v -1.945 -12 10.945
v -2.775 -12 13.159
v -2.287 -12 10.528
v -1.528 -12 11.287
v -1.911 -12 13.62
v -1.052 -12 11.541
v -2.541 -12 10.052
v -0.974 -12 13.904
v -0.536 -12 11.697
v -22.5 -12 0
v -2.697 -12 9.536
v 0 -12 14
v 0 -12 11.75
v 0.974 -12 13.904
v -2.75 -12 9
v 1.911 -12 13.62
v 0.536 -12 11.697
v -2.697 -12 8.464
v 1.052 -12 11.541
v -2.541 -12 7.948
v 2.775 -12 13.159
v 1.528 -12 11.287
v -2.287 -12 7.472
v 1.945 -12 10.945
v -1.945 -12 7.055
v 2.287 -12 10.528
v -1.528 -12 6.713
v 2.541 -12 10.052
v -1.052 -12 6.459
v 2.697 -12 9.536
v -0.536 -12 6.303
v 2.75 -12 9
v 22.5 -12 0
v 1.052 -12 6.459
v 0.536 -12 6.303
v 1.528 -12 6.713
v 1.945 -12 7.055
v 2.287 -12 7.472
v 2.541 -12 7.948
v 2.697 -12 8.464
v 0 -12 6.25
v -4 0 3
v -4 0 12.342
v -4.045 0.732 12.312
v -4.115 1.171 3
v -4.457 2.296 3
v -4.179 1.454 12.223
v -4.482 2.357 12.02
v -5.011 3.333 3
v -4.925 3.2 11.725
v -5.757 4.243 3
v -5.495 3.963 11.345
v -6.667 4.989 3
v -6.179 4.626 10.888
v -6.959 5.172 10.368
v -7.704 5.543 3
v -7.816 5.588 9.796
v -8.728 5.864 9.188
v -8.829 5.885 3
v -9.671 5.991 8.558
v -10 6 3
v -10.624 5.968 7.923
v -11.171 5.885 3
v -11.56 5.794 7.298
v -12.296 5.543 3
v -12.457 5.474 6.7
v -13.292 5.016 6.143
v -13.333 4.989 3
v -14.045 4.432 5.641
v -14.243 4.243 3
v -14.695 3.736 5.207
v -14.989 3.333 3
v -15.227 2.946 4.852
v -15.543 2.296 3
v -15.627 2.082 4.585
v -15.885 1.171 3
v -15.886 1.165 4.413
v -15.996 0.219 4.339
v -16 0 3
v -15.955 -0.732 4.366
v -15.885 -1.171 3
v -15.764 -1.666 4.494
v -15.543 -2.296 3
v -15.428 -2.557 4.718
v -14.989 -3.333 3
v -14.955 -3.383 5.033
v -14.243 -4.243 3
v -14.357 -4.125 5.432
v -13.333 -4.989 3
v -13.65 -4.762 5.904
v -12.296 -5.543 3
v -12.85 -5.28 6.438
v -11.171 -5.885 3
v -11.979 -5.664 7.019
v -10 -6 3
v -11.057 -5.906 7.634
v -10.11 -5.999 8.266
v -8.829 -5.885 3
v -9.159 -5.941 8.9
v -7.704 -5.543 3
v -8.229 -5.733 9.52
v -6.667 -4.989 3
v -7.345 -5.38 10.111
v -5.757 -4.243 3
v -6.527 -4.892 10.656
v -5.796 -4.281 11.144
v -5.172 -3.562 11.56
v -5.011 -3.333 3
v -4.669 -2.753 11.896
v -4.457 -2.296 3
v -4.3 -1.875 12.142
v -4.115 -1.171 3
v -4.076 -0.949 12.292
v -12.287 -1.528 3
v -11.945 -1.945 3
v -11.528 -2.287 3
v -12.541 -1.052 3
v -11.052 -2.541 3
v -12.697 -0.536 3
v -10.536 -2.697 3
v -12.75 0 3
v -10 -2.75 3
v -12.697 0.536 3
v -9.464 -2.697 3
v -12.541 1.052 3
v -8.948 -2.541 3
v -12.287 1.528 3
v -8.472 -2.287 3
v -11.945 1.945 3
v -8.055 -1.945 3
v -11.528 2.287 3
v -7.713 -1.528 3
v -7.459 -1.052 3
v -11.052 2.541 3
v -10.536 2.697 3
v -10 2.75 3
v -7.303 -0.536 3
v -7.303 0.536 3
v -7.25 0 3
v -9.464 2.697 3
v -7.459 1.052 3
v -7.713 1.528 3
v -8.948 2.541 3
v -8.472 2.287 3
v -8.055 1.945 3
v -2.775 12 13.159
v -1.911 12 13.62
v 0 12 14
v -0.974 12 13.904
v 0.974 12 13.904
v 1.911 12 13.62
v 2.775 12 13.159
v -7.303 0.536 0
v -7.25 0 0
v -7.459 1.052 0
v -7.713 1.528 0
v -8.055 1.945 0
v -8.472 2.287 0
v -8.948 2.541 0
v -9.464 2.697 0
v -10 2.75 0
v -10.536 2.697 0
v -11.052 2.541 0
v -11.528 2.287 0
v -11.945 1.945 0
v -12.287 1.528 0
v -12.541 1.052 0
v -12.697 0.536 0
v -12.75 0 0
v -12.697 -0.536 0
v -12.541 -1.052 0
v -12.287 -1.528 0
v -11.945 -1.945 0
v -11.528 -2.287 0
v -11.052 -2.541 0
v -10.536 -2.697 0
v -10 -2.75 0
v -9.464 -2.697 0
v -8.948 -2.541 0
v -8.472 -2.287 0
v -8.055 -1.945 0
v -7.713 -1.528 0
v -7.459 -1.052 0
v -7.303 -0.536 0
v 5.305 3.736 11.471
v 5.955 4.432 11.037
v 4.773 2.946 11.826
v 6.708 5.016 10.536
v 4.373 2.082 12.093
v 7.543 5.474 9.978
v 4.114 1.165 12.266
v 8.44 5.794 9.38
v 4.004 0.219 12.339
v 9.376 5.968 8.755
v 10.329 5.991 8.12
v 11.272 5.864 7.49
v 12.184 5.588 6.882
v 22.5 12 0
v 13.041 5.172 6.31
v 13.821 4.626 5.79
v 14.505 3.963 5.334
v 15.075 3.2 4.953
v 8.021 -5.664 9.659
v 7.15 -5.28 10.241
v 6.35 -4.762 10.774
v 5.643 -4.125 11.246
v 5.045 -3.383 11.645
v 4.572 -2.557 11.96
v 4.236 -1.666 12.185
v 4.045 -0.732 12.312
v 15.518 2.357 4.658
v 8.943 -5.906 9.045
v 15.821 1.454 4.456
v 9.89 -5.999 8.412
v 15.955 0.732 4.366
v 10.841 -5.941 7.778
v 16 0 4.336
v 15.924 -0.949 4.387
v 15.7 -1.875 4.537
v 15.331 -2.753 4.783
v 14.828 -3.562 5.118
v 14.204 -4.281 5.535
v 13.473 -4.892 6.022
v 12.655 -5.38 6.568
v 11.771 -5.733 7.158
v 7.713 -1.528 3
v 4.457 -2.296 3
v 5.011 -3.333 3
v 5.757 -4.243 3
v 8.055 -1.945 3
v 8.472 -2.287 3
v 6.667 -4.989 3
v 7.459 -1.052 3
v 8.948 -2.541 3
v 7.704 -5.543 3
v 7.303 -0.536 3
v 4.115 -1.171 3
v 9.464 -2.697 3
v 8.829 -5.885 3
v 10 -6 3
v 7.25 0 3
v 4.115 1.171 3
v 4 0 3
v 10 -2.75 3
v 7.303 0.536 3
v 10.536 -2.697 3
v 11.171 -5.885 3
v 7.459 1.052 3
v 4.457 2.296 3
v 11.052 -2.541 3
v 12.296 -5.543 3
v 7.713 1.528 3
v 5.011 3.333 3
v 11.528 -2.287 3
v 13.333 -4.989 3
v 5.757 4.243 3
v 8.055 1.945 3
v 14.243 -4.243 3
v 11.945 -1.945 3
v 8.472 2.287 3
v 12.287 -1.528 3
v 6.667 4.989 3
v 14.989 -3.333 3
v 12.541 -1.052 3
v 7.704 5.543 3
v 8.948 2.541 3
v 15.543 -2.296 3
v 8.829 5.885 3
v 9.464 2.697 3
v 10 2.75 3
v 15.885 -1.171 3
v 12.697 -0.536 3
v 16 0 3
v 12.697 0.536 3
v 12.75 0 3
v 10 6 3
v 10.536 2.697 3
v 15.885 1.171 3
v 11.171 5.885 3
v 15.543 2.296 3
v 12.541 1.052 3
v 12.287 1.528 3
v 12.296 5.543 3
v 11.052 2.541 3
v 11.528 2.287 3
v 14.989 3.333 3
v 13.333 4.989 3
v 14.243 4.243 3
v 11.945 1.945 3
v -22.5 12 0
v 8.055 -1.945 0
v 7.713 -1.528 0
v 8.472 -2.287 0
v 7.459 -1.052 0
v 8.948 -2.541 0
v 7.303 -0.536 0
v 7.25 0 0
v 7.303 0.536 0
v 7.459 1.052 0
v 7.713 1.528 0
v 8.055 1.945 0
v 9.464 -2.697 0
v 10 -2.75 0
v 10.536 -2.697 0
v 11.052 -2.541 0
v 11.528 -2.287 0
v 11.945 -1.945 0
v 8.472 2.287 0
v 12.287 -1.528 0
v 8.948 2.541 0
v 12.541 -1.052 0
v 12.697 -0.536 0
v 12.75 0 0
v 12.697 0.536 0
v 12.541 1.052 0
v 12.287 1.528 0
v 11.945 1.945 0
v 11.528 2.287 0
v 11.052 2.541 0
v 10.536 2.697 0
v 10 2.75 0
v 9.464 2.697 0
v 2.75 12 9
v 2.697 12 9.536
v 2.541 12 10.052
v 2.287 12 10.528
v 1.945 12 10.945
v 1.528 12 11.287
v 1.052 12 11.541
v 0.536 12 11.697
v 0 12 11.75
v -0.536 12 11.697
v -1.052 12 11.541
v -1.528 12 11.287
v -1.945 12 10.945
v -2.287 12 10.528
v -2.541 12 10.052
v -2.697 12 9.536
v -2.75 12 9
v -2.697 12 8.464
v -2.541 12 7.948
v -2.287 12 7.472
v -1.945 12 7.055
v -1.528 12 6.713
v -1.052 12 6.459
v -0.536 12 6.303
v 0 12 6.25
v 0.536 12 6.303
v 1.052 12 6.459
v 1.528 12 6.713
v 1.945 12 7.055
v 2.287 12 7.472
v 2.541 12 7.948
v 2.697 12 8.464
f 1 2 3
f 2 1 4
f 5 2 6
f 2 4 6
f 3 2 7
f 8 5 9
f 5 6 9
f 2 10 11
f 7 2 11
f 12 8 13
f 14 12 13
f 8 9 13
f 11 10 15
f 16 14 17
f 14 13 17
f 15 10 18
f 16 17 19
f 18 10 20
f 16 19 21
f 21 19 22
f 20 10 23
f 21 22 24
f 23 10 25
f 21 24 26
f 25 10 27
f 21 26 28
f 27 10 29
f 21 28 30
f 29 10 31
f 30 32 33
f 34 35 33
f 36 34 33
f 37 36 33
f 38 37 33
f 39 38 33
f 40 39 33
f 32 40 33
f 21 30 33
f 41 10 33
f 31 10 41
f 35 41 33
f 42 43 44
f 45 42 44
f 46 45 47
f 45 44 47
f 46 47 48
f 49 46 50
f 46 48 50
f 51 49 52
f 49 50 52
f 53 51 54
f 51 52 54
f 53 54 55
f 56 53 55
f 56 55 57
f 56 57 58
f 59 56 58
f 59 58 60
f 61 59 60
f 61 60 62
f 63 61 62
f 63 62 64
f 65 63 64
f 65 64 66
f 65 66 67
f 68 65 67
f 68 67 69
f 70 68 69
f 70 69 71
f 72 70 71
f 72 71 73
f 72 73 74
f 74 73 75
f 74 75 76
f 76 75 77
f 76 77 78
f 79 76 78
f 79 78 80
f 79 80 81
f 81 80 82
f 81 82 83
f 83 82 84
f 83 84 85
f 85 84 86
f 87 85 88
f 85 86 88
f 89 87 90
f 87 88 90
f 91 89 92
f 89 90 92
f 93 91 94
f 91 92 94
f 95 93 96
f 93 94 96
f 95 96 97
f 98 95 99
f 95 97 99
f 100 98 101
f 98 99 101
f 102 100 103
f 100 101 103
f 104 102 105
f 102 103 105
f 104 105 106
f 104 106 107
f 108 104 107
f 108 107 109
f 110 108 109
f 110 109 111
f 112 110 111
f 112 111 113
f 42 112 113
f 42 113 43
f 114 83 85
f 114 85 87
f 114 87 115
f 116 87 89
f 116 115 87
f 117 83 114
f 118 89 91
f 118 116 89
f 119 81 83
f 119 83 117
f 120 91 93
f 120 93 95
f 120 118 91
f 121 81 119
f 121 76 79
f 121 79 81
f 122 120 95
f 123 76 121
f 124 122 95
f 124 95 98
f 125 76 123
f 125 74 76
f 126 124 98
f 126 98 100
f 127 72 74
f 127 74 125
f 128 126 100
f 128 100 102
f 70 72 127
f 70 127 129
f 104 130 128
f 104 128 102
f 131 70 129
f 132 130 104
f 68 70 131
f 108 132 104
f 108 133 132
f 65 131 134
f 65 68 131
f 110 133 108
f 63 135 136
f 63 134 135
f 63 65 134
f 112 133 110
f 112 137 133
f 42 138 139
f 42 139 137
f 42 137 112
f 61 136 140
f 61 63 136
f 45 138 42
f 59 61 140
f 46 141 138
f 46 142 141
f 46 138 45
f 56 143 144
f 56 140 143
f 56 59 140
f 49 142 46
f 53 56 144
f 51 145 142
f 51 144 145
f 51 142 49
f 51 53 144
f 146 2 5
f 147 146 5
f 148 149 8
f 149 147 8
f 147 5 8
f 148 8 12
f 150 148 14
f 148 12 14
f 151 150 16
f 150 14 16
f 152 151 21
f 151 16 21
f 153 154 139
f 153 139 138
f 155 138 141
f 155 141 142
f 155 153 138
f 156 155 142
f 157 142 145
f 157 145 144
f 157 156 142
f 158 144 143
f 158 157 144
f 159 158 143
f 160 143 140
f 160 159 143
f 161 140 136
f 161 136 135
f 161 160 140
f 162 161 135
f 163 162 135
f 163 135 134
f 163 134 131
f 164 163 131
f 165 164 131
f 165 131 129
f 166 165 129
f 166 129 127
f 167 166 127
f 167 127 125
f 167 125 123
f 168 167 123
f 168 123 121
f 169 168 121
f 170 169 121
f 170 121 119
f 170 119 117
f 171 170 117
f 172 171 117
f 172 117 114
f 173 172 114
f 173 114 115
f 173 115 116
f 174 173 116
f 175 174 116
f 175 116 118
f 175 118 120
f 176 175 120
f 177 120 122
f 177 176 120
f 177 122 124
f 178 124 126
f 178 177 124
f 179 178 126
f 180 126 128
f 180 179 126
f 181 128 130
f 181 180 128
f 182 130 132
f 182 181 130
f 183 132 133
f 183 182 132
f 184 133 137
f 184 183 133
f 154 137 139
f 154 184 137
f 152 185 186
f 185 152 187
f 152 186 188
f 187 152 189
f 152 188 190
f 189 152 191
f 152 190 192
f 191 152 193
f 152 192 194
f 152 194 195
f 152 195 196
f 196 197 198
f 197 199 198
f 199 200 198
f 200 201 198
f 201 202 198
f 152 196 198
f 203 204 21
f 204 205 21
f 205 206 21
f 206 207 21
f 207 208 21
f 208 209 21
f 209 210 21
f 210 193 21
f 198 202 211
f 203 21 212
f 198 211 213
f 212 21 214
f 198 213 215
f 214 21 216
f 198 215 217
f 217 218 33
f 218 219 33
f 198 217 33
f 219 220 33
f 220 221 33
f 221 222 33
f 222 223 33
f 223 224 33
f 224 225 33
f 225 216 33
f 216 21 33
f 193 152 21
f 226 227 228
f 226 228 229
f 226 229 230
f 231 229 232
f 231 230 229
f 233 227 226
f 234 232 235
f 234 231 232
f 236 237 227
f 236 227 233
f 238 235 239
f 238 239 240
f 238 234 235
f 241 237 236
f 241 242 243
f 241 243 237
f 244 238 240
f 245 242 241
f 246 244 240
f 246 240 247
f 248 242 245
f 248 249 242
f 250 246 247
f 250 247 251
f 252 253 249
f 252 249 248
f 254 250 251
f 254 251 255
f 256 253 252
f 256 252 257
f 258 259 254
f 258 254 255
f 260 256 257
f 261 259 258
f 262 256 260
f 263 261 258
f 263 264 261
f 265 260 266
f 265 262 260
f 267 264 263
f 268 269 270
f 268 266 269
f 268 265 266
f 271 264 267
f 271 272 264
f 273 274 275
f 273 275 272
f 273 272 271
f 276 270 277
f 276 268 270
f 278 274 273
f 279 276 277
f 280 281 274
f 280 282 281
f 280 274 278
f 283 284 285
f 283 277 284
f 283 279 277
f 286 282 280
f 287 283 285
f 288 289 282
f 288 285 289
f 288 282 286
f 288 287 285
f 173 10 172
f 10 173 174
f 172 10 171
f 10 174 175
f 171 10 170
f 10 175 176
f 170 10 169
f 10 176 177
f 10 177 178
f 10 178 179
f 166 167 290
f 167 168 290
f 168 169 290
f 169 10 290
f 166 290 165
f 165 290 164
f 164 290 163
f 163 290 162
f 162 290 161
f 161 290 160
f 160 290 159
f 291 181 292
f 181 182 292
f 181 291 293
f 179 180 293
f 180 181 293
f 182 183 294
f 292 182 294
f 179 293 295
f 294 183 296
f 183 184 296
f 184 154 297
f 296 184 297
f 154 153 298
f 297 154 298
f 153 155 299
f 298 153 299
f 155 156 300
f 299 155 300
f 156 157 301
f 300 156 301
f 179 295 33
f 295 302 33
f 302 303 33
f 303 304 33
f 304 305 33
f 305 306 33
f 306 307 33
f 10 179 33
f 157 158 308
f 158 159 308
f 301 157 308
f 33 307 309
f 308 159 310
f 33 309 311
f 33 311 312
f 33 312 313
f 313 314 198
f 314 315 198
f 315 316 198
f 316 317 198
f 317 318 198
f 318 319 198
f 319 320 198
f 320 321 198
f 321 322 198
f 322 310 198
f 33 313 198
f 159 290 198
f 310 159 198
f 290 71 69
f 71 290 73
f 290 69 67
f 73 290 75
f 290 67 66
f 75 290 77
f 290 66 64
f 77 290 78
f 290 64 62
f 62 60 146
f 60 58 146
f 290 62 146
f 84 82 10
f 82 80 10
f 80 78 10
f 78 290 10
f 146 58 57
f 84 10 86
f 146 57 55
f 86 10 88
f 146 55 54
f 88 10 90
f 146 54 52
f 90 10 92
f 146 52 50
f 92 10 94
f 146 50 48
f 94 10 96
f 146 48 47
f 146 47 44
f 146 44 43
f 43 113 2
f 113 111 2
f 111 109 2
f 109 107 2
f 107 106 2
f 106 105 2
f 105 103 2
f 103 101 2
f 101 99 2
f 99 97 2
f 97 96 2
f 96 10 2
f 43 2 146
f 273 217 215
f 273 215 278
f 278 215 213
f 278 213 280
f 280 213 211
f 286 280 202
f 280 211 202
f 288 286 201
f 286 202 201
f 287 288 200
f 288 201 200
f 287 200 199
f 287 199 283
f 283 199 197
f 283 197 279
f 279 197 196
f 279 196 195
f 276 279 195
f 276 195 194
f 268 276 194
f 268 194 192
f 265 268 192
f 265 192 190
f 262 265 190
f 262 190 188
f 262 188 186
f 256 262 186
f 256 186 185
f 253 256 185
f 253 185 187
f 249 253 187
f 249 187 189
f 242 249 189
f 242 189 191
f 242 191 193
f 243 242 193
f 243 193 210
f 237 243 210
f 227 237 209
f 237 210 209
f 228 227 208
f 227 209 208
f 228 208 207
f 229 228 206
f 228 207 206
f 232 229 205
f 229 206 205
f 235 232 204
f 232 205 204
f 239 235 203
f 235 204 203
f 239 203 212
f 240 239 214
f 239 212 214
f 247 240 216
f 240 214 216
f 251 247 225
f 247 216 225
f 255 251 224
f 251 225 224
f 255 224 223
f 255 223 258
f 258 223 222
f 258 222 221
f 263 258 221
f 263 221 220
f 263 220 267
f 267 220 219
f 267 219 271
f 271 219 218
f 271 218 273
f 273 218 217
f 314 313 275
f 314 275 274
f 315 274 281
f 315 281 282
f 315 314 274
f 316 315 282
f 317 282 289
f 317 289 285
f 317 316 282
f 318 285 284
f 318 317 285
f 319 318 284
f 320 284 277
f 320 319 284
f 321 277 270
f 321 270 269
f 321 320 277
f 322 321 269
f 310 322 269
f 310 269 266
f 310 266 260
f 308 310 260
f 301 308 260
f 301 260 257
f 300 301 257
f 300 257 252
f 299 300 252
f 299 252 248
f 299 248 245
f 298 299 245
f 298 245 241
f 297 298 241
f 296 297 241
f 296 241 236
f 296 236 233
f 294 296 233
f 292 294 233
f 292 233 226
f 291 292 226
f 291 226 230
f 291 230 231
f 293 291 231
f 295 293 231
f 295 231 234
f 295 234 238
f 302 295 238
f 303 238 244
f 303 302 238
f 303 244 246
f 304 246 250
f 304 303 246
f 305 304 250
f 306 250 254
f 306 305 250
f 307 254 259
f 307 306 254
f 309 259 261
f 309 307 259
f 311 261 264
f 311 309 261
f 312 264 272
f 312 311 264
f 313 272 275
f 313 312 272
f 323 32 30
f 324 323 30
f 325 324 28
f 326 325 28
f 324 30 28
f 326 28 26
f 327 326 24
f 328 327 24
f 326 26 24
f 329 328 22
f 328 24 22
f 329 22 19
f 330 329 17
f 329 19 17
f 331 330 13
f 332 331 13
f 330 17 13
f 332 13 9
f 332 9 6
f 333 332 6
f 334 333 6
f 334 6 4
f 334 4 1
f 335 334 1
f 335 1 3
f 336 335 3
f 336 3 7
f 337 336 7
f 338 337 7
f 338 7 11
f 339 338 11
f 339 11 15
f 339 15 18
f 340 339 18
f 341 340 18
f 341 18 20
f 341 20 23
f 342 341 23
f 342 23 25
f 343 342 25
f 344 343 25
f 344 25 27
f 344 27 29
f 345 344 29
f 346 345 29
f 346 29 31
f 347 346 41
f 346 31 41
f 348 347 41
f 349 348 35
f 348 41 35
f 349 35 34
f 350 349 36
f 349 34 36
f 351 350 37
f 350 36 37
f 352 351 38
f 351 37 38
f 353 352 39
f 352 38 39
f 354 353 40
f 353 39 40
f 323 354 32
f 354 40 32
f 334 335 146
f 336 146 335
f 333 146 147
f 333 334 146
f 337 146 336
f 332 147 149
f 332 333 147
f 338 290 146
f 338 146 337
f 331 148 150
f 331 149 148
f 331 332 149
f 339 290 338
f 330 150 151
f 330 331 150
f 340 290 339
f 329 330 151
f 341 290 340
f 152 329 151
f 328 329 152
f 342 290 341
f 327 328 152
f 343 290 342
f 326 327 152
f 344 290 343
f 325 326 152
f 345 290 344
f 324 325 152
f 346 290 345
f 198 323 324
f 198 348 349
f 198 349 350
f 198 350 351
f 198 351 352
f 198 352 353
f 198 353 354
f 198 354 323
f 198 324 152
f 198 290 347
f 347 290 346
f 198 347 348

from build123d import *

# Parameters (mm, degrees)
F0_W     = 45
F0_H     = 24
F0_R     = 2.75
F1_DEPTH = 15
F2_R     = 6
F2_R_2   = 2.75
F3_DEPTH = 12
F4_R     = 2.75
F5_DEPTH = 24.001


with BuildPart() as f1:
    # F0 (on Top) → F1 (new body)
    with BuildSketch(Plane.XY):
        Rectangle(F0_W, F0_H)
        with Locations((-10, 0)):
            Circle(F0_R, mode=Mode.SUBTRACT)
        with Locations((10, 0)):
            Circle(F0_R, mode=Mode.SUBTRACT)
    extrude(amount=F1_DEPTH)

    # F2 (on face) → F3 (cut)
    with BuildSketch(Plane.XY.offset(15)):
        with Locations((-10, 0)):
            Circle(F2_R)
        with Locations((-10, 0)):
            Circle(F2_R_2, mode=Mode.SUBTRACT)
        with Locations((10, 0)):
            Circle(F2_R)
        with Locations((10, 0)):
            Circle(F2_R_2, mode=Mode.SUBTRACT)
    extrude(amount=-F3_DEPTH, mode=Mode.SUBTRACT)

    # F4 (on face) → F5 (cut, through all)
    with BuildSketch(Plane.XZ.offset(12)):
        with Locations((0, 9)):
            Circle(F4_R)
        with BuildLine():
            ThreePointArc((-2.774851, 13.159351), (0, 14), (2.774851, 13.159351))
            Line((2.774851, 13.159351), (22.5, 0))
            Line((22.5, 0), (22.5, 15))
            Line((22.5, 15), (-22.5, 15))
            Line((-22.5, 15), (-22.5, 0))
            Line((-22.5, 0), (-2.774851, 13.159351))
        make_face()
    extrude(amount=-F5_DEPTH, mode=Mode.SUBTRACT)


solid = f1.part
